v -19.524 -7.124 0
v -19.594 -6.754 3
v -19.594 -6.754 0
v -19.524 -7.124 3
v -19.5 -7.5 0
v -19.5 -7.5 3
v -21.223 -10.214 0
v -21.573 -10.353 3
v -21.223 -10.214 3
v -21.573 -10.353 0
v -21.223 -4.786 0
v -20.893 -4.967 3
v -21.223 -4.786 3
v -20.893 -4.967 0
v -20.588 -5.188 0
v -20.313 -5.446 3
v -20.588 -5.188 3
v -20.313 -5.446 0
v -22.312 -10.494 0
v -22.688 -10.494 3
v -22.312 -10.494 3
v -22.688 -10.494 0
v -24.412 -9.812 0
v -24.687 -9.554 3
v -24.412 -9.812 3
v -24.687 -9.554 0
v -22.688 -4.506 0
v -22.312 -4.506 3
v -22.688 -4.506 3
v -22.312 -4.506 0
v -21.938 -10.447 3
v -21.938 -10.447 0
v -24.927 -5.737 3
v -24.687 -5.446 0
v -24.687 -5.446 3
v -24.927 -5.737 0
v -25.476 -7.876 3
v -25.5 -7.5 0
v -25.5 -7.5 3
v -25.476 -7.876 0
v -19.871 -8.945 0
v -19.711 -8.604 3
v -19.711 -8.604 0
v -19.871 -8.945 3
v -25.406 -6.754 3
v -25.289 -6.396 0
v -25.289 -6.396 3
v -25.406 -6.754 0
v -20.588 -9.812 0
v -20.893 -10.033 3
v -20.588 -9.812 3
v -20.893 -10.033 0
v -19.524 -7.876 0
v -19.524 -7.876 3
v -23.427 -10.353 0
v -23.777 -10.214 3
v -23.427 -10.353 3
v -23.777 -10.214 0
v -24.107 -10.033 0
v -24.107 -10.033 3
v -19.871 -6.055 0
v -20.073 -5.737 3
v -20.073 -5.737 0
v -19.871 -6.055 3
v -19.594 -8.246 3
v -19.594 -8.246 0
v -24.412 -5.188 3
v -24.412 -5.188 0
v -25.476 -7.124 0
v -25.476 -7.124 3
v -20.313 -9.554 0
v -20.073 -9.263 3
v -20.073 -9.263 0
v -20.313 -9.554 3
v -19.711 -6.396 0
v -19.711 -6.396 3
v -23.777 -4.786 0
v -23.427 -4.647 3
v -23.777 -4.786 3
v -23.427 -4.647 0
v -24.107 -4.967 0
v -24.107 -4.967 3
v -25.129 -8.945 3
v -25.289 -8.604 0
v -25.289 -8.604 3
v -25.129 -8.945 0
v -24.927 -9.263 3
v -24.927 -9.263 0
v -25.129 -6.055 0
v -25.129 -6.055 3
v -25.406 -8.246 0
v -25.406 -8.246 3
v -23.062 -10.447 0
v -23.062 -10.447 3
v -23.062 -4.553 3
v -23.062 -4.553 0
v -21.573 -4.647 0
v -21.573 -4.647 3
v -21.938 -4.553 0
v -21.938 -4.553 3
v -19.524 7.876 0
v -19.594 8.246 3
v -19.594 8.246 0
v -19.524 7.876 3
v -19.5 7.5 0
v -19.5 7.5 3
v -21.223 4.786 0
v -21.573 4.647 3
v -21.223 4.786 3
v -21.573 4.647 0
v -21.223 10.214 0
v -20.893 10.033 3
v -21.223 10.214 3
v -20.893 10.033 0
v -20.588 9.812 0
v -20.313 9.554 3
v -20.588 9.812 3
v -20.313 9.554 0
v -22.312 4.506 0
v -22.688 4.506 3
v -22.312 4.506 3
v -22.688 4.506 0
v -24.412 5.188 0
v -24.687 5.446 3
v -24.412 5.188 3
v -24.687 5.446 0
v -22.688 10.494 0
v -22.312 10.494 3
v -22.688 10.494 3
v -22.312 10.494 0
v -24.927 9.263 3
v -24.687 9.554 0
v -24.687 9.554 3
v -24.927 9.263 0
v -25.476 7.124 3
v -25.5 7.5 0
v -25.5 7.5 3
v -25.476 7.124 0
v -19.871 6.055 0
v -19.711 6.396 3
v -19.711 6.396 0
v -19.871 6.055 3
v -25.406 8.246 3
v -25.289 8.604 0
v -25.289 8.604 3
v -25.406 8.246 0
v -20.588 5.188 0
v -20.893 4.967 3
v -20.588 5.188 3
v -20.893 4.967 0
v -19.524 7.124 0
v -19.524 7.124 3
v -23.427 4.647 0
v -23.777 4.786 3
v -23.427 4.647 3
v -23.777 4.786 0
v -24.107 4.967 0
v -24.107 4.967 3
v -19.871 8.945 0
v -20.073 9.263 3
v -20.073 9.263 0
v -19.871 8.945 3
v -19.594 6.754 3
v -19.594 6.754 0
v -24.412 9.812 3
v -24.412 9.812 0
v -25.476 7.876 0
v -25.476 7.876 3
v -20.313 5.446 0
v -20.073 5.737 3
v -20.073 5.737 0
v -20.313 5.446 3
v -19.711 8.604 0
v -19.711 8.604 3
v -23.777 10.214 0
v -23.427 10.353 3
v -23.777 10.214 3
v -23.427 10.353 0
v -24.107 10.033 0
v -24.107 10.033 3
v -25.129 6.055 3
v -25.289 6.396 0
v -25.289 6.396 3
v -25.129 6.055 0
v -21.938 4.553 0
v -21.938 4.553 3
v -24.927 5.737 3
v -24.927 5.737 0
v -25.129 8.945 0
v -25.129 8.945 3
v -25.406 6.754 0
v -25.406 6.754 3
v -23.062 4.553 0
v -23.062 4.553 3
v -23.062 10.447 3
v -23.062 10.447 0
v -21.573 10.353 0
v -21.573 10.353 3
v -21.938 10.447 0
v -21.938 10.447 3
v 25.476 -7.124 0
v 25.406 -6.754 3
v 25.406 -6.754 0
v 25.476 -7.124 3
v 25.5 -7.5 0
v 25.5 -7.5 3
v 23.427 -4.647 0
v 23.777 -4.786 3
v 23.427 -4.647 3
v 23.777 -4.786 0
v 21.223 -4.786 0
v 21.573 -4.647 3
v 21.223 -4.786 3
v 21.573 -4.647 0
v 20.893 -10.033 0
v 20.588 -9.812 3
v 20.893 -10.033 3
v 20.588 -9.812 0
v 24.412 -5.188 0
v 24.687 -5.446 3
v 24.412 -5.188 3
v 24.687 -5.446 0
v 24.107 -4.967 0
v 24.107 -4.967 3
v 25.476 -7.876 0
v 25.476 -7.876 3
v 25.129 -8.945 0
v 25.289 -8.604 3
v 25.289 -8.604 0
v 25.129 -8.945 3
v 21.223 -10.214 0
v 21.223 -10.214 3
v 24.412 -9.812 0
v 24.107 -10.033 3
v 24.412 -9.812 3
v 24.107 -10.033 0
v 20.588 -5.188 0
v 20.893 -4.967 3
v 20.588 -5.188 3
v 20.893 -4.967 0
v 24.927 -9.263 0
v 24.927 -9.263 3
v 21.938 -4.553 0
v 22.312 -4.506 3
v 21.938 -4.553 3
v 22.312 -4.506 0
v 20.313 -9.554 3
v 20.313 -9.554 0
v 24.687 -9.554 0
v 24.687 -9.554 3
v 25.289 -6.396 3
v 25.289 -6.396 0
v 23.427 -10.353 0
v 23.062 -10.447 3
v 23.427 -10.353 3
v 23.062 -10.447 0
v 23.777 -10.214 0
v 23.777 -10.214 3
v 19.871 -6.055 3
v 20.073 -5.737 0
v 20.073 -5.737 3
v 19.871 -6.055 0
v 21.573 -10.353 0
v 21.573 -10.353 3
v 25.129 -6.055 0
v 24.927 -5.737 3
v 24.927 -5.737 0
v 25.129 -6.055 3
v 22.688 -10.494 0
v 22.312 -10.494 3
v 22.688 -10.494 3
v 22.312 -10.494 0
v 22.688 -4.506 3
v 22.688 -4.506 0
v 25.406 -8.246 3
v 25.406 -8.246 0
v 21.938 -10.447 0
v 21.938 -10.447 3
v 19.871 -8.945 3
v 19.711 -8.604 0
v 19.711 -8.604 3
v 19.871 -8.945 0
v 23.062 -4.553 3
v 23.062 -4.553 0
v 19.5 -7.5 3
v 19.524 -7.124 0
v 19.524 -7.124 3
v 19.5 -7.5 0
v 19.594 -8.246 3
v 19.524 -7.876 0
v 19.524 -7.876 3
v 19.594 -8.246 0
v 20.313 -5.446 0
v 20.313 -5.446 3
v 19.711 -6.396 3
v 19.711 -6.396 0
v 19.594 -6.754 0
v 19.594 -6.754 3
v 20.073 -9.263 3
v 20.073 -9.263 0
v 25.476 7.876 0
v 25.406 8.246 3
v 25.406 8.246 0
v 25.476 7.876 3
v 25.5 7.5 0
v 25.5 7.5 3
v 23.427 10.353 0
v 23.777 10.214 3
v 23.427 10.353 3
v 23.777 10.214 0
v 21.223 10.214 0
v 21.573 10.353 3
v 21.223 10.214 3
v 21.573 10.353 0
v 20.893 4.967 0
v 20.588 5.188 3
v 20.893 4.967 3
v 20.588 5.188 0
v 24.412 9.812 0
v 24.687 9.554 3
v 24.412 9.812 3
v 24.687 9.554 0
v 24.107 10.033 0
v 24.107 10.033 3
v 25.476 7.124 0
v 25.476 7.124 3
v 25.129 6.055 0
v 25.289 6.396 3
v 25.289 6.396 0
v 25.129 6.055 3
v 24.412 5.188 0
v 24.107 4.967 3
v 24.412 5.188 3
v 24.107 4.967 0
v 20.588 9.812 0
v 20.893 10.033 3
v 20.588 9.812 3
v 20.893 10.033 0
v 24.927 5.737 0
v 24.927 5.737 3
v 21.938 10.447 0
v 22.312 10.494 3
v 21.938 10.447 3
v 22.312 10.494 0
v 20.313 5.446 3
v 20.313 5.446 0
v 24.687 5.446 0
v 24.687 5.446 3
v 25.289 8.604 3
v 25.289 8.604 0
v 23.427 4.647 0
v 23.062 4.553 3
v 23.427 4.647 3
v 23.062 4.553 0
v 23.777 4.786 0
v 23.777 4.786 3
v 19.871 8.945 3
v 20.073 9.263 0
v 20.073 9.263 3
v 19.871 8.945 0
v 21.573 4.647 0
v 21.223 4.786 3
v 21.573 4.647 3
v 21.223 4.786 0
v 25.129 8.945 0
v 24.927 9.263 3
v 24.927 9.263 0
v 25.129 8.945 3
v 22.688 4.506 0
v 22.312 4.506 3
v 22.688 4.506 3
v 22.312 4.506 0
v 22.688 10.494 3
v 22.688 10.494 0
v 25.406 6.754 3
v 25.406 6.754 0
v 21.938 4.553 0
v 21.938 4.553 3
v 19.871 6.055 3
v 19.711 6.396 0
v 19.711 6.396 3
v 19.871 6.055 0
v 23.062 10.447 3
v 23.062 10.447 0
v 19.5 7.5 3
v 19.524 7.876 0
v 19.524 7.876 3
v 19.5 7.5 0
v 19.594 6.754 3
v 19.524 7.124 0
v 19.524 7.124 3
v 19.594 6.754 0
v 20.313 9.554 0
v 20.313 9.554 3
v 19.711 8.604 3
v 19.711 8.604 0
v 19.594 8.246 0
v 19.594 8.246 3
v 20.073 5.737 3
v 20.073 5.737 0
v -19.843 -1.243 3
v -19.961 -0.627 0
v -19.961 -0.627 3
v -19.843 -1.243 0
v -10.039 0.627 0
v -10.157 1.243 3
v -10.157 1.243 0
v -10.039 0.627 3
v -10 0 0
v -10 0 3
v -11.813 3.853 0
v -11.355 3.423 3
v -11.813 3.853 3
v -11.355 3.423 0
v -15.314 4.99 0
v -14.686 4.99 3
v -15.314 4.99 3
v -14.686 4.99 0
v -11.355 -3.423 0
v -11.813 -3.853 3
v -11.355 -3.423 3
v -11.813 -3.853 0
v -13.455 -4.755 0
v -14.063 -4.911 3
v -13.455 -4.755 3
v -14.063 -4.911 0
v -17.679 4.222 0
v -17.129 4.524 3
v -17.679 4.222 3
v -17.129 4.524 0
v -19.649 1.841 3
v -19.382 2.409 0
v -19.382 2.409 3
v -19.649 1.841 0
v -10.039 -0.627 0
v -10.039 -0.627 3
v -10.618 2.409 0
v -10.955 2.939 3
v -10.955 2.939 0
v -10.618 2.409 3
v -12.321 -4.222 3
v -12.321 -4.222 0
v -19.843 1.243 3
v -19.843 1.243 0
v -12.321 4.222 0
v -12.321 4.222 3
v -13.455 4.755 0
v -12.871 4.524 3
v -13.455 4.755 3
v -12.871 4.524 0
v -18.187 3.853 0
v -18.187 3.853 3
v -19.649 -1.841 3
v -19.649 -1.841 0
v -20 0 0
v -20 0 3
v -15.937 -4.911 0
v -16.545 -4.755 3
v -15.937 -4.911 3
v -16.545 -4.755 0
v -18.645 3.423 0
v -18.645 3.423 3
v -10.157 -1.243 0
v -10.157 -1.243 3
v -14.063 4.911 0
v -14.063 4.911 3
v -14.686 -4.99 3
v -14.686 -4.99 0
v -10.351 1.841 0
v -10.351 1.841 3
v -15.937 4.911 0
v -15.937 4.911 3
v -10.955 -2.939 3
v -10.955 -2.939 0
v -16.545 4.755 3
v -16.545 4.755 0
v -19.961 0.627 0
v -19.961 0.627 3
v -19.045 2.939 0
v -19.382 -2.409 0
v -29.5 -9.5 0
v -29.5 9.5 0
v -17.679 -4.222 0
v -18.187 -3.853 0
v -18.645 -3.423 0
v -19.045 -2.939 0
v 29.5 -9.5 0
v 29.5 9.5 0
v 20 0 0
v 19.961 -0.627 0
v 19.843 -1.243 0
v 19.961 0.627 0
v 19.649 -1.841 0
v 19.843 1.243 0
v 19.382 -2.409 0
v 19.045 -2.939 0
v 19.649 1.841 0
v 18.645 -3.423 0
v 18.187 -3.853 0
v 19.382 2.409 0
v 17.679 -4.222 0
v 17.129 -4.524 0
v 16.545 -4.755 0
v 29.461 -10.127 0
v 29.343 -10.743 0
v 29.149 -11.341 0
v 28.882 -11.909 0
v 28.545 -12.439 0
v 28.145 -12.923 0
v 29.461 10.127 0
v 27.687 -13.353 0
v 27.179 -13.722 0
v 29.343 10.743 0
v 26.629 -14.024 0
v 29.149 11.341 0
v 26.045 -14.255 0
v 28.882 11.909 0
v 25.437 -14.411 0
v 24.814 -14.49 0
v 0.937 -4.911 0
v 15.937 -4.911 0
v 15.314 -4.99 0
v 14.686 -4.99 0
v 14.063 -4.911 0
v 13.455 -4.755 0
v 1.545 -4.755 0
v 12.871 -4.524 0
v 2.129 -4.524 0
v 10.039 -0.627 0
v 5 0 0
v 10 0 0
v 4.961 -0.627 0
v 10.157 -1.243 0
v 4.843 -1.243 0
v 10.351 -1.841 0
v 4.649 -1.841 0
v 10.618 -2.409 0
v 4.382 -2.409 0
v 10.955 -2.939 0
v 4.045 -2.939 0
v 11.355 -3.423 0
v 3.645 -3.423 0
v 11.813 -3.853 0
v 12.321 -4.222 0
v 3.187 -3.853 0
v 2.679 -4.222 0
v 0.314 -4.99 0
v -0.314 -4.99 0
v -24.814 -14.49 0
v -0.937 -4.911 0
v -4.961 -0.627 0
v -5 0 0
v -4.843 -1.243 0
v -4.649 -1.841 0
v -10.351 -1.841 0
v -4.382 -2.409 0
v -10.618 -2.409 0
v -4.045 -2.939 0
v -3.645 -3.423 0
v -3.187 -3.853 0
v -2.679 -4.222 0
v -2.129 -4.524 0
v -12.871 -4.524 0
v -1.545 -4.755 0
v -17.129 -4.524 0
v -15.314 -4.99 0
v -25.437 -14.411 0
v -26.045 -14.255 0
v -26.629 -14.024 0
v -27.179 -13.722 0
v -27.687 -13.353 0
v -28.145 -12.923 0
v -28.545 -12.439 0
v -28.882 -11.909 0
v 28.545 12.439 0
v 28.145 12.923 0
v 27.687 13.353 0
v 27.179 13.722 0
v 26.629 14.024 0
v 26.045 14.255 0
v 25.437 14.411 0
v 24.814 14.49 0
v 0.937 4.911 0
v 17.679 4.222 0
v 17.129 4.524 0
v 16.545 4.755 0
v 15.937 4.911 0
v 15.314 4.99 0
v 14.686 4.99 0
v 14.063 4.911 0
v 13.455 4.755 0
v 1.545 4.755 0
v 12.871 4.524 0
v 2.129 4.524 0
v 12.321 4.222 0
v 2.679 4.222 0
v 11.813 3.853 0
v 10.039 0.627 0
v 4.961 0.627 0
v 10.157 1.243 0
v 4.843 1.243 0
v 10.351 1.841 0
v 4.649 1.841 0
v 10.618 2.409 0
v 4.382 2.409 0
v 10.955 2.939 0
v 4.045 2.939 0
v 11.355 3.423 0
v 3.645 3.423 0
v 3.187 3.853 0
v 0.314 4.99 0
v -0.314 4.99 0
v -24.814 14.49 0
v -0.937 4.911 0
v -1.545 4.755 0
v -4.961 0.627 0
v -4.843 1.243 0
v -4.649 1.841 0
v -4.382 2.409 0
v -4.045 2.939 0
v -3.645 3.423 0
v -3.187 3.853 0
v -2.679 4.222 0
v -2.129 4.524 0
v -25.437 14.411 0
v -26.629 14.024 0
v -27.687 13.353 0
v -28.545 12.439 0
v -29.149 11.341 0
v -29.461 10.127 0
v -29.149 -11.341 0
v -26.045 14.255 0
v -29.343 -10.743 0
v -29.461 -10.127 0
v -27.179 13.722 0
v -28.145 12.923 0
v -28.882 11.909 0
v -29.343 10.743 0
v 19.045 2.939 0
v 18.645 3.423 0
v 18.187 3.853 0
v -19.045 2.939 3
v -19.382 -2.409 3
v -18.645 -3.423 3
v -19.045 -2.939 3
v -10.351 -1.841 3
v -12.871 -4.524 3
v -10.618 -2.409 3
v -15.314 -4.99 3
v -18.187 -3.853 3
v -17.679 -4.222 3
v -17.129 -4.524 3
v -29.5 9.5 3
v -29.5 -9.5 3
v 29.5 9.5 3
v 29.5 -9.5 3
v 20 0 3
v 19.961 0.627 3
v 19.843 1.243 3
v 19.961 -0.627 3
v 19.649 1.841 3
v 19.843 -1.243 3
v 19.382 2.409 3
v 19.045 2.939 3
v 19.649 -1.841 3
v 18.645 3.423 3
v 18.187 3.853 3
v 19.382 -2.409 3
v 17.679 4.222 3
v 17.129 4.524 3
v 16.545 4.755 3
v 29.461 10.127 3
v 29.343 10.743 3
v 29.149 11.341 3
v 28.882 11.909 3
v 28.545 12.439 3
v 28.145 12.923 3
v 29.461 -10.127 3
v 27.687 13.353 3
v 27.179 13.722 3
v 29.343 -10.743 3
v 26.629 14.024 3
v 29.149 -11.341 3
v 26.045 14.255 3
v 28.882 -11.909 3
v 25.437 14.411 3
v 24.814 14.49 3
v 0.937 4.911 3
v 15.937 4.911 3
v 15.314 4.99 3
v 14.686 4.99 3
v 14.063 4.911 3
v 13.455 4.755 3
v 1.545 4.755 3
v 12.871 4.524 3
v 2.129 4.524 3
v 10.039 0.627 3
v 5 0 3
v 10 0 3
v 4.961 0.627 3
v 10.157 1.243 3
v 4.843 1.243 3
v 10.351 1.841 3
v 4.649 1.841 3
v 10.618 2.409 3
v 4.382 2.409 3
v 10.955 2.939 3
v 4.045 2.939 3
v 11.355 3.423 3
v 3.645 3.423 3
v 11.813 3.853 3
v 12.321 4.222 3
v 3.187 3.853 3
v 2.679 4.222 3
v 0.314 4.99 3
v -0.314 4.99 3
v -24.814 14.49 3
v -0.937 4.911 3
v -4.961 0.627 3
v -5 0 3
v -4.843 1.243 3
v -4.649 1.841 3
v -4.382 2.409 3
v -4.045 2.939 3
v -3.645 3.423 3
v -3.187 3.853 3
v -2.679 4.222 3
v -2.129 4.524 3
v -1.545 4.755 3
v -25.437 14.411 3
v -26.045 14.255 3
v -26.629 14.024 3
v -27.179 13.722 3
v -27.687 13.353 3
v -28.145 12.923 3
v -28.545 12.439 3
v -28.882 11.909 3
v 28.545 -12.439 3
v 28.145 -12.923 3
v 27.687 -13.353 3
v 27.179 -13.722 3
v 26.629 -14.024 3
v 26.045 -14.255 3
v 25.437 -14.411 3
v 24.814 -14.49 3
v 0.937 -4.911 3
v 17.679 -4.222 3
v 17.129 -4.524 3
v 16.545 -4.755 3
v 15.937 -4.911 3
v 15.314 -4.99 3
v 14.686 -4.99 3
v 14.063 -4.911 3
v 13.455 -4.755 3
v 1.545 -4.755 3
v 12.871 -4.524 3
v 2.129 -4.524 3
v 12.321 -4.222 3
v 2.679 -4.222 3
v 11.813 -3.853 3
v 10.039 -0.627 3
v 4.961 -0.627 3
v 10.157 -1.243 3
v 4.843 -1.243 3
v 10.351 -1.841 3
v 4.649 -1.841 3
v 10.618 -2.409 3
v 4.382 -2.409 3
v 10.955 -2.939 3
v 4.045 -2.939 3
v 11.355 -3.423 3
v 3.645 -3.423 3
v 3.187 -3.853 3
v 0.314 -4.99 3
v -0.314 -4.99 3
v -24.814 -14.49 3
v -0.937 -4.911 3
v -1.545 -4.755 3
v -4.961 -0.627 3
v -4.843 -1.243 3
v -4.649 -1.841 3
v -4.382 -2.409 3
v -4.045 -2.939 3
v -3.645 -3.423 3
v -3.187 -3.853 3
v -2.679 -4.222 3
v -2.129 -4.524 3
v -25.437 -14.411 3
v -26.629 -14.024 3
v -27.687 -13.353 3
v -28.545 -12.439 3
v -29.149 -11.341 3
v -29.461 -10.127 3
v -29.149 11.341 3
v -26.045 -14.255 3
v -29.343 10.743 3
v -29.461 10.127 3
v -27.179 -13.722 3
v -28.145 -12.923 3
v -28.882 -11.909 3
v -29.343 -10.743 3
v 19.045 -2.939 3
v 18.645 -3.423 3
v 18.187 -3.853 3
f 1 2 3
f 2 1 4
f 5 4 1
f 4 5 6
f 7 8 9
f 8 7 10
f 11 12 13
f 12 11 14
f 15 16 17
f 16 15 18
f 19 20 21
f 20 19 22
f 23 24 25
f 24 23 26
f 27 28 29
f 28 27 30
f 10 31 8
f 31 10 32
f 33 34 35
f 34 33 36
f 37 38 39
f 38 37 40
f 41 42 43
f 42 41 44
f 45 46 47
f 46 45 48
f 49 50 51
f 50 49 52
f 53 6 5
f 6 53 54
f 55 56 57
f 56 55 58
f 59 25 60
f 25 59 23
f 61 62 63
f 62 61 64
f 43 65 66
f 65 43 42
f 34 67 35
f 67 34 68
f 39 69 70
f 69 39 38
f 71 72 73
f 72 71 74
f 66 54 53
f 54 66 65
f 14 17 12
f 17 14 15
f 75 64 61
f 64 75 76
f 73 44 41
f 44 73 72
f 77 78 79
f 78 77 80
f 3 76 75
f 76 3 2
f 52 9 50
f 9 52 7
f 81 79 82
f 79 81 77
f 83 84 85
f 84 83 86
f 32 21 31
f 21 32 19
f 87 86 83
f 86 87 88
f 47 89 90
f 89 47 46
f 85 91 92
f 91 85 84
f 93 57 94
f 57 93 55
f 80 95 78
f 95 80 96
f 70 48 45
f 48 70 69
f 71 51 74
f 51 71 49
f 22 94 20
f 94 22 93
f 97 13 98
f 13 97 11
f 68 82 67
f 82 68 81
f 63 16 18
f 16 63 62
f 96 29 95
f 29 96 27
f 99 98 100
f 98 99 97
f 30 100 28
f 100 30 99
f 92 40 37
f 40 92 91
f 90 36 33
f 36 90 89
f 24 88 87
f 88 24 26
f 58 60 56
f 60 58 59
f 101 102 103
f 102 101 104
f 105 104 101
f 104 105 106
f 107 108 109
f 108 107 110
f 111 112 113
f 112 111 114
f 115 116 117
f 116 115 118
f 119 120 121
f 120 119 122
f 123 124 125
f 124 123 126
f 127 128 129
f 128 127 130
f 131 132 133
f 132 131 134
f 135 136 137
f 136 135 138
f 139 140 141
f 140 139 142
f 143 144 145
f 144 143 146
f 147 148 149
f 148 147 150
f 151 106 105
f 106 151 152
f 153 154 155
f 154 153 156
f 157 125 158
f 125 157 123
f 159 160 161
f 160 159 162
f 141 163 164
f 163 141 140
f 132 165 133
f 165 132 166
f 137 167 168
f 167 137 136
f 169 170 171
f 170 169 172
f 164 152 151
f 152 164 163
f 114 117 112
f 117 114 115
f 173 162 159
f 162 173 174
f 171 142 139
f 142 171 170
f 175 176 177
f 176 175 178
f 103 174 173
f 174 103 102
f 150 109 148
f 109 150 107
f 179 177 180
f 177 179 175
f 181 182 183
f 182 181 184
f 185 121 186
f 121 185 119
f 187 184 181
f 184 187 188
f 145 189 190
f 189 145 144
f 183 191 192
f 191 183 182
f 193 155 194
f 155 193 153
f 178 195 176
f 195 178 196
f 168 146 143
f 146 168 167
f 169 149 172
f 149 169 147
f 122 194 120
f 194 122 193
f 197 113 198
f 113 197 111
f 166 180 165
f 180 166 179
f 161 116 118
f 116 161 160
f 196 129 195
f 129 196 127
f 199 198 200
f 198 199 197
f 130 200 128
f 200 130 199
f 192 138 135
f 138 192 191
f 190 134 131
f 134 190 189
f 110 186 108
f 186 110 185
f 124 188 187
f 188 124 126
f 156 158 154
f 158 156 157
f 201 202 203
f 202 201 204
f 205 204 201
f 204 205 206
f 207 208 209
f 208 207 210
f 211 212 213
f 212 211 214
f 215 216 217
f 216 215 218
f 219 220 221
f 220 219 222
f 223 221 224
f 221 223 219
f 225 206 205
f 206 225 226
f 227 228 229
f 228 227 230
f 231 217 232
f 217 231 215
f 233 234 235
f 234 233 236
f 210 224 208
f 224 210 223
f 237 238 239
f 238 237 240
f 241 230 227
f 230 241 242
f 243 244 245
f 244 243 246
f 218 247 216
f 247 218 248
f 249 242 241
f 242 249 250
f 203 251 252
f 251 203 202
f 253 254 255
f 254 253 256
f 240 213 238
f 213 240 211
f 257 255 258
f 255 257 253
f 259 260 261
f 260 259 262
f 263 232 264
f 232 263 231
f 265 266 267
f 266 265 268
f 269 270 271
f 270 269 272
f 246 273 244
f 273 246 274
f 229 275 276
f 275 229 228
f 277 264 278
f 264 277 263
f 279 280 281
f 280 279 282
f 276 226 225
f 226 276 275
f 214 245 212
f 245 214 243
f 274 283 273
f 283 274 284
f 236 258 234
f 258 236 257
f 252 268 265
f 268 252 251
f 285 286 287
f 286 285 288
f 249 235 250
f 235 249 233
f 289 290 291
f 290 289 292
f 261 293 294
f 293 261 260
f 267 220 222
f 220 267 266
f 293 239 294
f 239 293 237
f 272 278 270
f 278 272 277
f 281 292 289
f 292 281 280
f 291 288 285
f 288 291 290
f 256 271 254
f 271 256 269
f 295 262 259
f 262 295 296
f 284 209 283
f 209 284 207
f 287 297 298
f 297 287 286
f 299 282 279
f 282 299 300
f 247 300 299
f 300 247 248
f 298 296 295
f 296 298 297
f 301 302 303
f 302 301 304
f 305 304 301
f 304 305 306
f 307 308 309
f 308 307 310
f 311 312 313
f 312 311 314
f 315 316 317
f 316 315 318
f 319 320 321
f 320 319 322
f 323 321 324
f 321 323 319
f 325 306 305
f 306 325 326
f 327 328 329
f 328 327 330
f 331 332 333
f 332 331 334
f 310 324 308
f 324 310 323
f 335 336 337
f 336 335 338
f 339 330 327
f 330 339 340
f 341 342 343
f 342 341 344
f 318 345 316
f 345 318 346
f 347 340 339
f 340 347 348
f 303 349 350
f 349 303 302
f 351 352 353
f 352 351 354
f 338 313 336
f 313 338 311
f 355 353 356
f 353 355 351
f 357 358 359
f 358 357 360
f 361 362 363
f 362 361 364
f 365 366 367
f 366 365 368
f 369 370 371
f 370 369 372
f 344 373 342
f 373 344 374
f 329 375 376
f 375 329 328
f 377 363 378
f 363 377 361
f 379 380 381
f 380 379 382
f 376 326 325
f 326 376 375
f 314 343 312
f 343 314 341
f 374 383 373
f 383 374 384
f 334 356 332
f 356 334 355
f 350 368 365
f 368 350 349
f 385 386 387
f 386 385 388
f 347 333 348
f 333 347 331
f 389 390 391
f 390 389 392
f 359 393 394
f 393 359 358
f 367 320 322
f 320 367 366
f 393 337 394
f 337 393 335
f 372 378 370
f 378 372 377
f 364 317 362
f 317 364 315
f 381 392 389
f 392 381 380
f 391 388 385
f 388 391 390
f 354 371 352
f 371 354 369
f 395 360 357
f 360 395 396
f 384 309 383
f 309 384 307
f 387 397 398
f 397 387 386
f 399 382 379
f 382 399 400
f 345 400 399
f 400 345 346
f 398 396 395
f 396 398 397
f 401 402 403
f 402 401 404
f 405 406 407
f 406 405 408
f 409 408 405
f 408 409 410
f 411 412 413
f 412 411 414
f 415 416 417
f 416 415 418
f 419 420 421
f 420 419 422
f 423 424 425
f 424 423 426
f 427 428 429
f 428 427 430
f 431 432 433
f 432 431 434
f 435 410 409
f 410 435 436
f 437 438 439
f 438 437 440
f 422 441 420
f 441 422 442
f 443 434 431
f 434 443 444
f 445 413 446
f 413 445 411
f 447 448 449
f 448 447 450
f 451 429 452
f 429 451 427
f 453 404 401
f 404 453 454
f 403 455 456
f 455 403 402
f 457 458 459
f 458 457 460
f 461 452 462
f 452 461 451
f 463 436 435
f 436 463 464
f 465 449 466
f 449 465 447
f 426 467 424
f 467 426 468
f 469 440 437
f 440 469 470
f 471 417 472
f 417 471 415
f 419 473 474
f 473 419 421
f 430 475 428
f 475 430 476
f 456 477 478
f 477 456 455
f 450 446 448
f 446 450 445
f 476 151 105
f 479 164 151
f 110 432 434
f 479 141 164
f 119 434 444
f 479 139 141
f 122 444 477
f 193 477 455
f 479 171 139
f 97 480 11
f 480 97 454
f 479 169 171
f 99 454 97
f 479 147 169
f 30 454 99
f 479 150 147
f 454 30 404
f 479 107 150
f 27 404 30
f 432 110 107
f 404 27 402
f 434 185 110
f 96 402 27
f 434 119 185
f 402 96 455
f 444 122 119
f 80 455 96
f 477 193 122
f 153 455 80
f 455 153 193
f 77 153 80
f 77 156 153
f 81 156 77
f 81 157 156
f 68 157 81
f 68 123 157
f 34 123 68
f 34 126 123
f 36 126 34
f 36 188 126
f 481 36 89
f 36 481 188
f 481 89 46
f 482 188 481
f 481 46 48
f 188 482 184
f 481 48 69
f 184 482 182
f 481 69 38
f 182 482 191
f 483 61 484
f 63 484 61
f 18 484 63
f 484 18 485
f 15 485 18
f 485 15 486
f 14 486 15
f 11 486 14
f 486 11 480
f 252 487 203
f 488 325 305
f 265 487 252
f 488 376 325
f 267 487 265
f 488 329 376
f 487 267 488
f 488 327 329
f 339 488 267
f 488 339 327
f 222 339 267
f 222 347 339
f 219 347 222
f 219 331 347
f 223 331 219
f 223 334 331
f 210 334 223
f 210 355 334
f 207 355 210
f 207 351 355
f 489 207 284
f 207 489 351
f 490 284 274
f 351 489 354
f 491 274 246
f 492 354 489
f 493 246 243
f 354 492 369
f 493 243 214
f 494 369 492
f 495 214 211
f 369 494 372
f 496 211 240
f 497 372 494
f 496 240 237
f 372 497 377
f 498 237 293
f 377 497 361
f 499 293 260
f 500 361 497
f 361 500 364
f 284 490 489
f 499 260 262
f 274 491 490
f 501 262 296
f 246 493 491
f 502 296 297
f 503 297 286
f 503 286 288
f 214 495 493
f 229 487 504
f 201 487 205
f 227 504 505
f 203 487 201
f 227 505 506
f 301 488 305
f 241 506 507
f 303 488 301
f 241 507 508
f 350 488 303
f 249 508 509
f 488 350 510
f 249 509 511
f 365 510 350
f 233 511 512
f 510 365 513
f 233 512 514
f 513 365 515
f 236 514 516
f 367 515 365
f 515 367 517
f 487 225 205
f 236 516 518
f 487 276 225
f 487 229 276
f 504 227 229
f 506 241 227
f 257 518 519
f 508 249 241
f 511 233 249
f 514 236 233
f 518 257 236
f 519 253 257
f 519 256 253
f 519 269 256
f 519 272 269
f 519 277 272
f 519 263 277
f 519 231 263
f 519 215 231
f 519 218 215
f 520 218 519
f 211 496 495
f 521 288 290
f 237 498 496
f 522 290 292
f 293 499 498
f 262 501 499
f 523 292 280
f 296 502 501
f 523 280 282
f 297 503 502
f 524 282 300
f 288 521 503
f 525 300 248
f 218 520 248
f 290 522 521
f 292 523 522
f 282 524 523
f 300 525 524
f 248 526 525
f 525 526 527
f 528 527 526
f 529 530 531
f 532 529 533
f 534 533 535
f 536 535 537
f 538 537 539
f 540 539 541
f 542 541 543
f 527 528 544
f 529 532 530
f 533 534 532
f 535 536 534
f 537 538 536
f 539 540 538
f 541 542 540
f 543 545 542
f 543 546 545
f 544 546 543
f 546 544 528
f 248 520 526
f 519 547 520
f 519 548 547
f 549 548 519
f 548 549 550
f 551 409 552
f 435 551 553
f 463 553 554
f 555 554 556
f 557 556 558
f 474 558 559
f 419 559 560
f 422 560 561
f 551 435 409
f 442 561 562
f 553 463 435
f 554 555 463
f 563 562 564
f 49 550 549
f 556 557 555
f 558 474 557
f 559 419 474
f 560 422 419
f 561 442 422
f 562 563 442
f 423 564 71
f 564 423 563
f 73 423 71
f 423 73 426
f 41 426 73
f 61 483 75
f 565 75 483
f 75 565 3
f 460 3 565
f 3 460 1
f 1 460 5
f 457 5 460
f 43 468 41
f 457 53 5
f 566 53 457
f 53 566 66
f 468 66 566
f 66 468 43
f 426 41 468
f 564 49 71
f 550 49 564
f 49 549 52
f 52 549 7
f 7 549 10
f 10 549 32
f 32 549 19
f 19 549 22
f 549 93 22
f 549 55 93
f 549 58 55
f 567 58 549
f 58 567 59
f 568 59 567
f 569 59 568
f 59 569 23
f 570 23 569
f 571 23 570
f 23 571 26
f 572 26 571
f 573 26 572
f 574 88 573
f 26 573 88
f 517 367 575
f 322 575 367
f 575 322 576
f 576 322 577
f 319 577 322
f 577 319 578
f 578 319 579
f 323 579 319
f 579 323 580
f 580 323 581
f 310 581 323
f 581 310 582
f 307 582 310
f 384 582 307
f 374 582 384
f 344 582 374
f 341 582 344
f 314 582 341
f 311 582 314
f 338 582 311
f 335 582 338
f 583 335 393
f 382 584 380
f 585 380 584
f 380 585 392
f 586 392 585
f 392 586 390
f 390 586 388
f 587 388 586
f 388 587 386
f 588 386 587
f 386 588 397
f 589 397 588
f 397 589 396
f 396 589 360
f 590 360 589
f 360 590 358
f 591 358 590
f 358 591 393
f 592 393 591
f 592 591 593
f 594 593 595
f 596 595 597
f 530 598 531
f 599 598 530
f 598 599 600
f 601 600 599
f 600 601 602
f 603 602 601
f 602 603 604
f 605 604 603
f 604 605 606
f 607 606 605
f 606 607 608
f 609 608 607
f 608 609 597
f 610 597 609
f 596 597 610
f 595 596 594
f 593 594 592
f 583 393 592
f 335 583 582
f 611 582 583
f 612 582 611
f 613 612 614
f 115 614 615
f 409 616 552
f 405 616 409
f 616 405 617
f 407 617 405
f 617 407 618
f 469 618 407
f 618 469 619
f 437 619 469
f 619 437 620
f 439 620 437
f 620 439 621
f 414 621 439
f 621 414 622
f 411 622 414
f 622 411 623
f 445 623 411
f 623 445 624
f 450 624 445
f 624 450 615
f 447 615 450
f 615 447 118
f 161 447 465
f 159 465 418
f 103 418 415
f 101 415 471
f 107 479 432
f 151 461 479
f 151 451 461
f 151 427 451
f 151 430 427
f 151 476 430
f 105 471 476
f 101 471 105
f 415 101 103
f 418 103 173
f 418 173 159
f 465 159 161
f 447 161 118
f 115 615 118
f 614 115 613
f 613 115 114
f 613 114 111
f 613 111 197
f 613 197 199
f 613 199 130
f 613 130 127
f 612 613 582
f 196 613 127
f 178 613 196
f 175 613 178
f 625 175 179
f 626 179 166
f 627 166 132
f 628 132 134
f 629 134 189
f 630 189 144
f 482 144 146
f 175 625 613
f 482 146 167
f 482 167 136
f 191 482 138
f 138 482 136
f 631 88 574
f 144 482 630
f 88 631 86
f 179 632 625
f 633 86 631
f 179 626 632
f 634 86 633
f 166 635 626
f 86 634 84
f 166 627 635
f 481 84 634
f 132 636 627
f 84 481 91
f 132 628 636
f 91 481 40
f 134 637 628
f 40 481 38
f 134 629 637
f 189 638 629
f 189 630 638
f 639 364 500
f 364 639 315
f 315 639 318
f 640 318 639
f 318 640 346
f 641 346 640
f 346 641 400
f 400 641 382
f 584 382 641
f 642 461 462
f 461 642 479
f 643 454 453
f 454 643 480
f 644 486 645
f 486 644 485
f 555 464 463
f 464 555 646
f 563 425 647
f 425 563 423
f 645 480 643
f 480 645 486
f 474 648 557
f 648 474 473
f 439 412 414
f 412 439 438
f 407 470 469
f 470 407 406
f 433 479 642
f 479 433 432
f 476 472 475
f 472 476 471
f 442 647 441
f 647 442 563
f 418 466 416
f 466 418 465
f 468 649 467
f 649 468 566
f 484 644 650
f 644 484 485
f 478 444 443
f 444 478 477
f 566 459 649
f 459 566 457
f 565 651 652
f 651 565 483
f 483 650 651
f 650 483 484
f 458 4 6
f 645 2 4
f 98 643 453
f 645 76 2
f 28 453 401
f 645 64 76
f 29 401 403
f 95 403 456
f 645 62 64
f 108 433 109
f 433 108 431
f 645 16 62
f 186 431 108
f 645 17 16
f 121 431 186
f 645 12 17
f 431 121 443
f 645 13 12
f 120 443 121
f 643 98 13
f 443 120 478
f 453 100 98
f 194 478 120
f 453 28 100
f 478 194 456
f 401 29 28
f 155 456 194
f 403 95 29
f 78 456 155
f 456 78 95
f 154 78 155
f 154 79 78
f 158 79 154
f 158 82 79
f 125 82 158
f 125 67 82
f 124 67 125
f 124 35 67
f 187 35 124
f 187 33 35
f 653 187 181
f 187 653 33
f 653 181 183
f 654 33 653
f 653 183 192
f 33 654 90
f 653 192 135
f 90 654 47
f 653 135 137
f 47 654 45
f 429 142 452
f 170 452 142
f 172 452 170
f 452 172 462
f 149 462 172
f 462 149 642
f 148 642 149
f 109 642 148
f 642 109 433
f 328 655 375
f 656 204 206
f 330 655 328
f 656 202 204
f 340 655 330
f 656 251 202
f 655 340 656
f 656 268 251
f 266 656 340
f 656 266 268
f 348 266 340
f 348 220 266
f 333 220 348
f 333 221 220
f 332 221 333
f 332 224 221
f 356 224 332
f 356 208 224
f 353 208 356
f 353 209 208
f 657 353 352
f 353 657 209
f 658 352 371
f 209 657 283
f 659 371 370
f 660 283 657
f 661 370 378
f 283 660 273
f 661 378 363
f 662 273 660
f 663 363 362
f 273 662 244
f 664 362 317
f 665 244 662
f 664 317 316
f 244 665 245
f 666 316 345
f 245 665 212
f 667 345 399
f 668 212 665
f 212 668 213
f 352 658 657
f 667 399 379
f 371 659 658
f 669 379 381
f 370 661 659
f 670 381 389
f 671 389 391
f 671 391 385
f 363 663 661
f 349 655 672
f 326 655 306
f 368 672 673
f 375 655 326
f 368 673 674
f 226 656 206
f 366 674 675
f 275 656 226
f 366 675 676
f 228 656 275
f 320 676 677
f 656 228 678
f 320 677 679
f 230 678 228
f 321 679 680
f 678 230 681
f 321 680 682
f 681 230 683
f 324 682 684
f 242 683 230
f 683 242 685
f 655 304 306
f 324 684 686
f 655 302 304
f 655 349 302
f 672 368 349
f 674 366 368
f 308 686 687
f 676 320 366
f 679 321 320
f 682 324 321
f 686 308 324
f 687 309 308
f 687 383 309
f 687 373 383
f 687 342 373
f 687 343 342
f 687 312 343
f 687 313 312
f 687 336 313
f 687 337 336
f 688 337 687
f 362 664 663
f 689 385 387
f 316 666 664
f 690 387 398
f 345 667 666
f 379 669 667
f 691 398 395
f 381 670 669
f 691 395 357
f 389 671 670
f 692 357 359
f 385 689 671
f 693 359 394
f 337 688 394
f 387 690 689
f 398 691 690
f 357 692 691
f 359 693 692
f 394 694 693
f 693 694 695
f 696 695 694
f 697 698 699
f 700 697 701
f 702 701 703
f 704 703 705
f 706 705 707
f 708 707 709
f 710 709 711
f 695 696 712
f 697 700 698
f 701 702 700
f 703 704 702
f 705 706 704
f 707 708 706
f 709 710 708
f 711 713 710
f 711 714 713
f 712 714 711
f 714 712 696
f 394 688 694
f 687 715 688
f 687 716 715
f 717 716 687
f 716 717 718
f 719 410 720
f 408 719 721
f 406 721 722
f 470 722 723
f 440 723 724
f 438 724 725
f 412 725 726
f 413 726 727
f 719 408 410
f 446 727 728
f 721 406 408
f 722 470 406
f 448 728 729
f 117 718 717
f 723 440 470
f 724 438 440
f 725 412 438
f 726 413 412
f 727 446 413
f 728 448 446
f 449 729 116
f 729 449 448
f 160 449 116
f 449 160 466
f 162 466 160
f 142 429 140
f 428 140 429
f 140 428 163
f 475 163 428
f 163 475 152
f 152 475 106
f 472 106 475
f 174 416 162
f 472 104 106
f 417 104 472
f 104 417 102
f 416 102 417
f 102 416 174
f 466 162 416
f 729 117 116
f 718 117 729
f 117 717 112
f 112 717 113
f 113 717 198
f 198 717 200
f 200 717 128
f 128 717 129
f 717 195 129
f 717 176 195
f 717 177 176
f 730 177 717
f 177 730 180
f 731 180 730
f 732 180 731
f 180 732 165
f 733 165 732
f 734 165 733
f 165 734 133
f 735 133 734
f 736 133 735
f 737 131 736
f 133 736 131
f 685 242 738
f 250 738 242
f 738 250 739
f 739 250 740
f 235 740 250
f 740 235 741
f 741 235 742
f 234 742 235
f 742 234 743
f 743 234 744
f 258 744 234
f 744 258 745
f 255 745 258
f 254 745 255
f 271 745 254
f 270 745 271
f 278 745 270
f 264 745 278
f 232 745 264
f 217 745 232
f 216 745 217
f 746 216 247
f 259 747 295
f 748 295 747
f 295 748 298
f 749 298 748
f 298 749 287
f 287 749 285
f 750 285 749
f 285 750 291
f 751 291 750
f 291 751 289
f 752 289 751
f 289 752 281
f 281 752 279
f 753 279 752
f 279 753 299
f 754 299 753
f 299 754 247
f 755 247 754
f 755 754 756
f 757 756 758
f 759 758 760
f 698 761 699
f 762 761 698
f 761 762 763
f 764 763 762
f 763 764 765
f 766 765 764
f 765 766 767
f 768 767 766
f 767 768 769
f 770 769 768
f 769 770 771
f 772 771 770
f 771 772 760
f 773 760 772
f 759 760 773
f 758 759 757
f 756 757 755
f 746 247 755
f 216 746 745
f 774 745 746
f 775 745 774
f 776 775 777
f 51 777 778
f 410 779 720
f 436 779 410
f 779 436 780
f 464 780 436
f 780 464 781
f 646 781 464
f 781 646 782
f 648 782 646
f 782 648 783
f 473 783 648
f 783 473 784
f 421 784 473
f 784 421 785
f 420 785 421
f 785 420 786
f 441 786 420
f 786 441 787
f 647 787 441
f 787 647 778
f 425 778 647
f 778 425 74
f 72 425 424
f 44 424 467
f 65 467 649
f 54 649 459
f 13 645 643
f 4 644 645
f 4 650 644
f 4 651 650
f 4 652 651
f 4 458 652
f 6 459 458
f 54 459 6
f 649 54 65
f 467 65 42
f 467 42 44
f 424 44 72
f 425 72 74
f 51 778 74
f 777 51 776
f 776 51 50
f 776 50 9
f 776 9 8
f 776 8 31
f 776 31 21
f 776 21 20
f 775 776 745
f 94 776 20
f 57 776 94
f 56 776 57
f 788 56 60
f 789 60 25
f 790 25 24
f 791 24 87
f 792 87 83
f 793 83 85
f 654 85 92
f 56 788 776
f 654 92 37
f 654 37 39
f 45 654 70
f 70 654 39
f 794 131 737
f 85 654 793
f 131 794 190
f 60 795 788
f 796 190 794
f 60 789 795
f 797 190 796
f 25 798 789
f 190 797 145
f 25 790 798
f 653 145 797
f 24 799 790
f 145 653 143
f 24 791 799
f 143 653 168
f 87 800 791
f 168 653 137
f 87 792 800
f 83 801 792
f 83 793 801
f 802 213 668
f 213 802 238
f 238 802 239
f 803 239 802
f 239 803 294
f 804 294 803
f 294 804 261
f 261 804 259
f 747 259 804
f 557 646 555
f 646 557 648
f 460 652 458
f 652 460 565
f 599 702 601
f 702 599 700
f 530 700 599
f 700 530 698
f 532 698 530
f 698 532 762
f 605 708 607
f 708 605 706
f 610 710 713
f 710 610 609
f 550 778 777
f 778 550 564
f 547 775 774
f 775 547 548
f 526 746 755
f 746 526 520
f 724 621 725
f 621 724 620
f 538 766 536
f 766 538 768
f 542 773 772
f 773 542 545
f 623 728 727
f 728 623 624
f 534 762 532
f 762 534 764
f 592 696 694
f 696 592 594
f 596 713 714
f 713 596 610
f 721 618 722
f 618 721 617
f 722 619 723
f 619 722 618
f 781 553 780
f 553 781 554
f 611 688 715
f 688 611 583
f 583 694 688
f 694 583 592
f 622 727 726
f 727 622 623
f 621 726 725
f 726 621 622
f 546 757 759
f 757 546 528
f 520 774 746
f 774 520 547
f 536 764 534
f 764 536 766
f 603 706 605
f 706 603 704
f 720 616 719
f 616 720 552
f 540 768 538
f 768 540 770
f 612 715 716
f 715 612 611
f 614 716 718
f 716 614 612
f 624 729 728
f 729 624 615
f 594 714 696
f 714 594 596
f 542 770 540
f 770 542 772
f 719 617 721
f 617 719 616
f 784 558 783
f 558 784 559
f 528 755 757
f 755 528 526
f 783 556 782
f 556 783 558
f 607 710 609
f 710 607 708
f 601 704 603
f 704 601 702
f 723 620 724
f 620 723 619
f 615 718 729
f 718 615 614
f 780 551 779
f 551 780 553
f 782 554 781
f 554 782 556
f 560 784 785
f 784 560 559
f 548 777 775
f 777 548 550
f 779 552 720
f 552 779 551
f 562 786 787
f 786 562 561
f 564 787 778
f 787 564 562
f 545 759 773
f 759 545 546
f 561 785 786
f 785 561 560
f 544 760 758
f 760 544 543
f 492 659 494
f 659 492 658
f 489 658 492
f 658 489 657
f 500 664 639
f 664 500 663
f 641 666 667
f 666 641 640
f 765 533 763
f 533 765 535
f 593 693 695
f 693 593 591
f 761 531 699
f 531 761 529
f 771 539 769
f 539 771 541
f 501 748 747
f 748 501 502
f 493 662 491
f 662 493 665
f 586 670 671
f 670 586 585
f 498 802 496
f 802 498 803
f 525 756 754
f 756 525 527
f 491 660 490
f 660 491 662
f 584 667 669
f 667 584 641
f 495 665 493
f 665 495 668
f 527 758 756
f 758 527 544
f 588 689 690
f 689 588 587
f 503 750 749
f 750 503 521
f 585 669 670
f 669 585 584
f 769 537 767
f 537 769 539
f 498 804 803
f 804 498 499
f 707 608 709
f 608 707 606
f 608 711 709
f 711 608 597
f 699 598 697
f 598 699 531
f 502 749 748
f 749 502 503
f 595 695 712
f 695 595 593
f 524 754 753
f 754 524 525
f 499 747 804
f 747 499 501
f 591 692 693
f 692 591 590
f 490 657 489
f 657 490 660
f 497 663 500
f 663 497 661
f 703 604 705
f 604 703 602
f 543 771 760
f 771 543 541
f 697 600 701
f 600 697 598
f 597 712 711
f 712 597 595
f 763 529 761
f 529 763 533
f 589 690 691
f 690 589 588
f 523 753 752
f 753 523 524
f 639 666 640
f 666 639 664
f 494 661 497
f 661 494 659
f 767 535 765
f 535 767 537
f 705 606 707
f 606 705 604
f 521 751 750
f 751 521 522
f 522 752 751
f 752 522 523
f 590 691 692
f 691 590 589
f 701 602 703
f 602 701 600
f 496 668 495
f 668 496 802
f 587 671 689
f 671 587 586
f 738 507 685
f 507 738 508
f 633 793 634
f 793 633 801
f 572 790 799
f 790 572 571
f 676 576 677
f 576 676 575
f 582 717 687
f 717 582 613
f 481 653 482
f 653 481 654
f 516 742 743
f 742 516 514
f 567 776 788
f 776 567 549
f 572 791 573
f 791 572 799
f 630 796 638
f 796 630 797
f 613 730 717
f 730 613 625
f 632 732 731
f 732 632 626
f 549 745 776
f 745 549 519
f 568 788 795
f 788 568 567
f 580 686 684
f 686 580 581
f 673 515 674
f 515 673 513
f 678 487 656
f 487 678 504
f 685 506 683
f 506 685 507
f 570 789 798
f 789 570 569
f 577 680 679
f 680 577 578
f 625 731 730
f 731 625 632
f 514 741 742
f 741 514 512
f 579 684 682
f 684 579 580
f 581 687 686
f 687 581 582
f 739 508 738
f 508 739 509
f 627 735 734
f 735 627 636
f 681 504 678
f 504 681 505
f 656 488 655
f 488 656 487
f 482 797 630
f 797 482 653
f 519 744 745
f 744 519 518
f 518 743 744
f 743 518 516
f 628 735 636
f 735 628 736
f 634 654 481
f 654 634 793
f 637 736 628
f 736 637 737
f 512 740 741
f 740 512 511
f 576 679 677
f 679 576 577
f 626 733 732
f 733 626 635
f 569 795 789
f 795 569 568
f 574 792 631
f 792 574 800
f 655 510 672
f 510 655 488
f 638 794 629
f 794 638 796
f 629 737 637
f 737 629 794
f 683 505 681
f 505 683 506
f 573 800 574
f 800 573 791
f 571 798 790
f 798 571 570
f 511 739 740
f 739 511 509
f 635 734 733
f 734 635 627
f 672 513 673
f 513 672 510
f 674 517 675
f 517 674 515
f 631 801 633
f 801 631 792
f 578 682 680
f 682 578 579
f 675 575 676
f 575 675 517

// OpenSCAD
$fn = 50;


difference() {
	union() {
		hull() {
			translate(v = [-24.5000000000, 9.5000000000, 0]) {
				cylinder(h = 3, r = 5);
			}
			translate(v = [24.5000000000, 9.5000000000, 0]) {
				cylinder(h = 3, r = 5);
			}
			translate(v = [-24.5000000000, -9.5000000000, 0]) {
				cylinder(h = 3, r = 5);
			}
			translate(v = [24.5000000000, -9.5000000000, 0]) {
				cylinder(h = 3, r = 5);
			}
		}
	}
	union() {
		#translate(v = [-22.5000000000, -7.5000000000, -100.0000000000]) {
			cylinder(h = 200, r = 3.0000000000);
		}
		#translate(v = [-22.5000000000, 7.5000000000, -100.0000000000]) {
			cylinder(h = 200, r = 3.0000000000);
		}
		#translate(v = [22.5000000000, -7.5000000000, -100.0000000000]) {
			cylinder(h = 200, r = 3.0000000000);
		}
		#translate(v = [22.5000000000, 7.5000000000, -100.0000000000]) {
			cylinder(h = 200, r = 3.0000000000);
		}
		#translate(v = [-15.0000000000, 0, 0]) {
			cylinder(h = 3, r = 5.0000000000);
		}
		#cylinder(h = 3, r = 5.0000000000);
		#translate(v = [15.0000000000, 0, 0]) {
			cylinder(h = 3, r = 5.0000000000);
		}
	}
}
